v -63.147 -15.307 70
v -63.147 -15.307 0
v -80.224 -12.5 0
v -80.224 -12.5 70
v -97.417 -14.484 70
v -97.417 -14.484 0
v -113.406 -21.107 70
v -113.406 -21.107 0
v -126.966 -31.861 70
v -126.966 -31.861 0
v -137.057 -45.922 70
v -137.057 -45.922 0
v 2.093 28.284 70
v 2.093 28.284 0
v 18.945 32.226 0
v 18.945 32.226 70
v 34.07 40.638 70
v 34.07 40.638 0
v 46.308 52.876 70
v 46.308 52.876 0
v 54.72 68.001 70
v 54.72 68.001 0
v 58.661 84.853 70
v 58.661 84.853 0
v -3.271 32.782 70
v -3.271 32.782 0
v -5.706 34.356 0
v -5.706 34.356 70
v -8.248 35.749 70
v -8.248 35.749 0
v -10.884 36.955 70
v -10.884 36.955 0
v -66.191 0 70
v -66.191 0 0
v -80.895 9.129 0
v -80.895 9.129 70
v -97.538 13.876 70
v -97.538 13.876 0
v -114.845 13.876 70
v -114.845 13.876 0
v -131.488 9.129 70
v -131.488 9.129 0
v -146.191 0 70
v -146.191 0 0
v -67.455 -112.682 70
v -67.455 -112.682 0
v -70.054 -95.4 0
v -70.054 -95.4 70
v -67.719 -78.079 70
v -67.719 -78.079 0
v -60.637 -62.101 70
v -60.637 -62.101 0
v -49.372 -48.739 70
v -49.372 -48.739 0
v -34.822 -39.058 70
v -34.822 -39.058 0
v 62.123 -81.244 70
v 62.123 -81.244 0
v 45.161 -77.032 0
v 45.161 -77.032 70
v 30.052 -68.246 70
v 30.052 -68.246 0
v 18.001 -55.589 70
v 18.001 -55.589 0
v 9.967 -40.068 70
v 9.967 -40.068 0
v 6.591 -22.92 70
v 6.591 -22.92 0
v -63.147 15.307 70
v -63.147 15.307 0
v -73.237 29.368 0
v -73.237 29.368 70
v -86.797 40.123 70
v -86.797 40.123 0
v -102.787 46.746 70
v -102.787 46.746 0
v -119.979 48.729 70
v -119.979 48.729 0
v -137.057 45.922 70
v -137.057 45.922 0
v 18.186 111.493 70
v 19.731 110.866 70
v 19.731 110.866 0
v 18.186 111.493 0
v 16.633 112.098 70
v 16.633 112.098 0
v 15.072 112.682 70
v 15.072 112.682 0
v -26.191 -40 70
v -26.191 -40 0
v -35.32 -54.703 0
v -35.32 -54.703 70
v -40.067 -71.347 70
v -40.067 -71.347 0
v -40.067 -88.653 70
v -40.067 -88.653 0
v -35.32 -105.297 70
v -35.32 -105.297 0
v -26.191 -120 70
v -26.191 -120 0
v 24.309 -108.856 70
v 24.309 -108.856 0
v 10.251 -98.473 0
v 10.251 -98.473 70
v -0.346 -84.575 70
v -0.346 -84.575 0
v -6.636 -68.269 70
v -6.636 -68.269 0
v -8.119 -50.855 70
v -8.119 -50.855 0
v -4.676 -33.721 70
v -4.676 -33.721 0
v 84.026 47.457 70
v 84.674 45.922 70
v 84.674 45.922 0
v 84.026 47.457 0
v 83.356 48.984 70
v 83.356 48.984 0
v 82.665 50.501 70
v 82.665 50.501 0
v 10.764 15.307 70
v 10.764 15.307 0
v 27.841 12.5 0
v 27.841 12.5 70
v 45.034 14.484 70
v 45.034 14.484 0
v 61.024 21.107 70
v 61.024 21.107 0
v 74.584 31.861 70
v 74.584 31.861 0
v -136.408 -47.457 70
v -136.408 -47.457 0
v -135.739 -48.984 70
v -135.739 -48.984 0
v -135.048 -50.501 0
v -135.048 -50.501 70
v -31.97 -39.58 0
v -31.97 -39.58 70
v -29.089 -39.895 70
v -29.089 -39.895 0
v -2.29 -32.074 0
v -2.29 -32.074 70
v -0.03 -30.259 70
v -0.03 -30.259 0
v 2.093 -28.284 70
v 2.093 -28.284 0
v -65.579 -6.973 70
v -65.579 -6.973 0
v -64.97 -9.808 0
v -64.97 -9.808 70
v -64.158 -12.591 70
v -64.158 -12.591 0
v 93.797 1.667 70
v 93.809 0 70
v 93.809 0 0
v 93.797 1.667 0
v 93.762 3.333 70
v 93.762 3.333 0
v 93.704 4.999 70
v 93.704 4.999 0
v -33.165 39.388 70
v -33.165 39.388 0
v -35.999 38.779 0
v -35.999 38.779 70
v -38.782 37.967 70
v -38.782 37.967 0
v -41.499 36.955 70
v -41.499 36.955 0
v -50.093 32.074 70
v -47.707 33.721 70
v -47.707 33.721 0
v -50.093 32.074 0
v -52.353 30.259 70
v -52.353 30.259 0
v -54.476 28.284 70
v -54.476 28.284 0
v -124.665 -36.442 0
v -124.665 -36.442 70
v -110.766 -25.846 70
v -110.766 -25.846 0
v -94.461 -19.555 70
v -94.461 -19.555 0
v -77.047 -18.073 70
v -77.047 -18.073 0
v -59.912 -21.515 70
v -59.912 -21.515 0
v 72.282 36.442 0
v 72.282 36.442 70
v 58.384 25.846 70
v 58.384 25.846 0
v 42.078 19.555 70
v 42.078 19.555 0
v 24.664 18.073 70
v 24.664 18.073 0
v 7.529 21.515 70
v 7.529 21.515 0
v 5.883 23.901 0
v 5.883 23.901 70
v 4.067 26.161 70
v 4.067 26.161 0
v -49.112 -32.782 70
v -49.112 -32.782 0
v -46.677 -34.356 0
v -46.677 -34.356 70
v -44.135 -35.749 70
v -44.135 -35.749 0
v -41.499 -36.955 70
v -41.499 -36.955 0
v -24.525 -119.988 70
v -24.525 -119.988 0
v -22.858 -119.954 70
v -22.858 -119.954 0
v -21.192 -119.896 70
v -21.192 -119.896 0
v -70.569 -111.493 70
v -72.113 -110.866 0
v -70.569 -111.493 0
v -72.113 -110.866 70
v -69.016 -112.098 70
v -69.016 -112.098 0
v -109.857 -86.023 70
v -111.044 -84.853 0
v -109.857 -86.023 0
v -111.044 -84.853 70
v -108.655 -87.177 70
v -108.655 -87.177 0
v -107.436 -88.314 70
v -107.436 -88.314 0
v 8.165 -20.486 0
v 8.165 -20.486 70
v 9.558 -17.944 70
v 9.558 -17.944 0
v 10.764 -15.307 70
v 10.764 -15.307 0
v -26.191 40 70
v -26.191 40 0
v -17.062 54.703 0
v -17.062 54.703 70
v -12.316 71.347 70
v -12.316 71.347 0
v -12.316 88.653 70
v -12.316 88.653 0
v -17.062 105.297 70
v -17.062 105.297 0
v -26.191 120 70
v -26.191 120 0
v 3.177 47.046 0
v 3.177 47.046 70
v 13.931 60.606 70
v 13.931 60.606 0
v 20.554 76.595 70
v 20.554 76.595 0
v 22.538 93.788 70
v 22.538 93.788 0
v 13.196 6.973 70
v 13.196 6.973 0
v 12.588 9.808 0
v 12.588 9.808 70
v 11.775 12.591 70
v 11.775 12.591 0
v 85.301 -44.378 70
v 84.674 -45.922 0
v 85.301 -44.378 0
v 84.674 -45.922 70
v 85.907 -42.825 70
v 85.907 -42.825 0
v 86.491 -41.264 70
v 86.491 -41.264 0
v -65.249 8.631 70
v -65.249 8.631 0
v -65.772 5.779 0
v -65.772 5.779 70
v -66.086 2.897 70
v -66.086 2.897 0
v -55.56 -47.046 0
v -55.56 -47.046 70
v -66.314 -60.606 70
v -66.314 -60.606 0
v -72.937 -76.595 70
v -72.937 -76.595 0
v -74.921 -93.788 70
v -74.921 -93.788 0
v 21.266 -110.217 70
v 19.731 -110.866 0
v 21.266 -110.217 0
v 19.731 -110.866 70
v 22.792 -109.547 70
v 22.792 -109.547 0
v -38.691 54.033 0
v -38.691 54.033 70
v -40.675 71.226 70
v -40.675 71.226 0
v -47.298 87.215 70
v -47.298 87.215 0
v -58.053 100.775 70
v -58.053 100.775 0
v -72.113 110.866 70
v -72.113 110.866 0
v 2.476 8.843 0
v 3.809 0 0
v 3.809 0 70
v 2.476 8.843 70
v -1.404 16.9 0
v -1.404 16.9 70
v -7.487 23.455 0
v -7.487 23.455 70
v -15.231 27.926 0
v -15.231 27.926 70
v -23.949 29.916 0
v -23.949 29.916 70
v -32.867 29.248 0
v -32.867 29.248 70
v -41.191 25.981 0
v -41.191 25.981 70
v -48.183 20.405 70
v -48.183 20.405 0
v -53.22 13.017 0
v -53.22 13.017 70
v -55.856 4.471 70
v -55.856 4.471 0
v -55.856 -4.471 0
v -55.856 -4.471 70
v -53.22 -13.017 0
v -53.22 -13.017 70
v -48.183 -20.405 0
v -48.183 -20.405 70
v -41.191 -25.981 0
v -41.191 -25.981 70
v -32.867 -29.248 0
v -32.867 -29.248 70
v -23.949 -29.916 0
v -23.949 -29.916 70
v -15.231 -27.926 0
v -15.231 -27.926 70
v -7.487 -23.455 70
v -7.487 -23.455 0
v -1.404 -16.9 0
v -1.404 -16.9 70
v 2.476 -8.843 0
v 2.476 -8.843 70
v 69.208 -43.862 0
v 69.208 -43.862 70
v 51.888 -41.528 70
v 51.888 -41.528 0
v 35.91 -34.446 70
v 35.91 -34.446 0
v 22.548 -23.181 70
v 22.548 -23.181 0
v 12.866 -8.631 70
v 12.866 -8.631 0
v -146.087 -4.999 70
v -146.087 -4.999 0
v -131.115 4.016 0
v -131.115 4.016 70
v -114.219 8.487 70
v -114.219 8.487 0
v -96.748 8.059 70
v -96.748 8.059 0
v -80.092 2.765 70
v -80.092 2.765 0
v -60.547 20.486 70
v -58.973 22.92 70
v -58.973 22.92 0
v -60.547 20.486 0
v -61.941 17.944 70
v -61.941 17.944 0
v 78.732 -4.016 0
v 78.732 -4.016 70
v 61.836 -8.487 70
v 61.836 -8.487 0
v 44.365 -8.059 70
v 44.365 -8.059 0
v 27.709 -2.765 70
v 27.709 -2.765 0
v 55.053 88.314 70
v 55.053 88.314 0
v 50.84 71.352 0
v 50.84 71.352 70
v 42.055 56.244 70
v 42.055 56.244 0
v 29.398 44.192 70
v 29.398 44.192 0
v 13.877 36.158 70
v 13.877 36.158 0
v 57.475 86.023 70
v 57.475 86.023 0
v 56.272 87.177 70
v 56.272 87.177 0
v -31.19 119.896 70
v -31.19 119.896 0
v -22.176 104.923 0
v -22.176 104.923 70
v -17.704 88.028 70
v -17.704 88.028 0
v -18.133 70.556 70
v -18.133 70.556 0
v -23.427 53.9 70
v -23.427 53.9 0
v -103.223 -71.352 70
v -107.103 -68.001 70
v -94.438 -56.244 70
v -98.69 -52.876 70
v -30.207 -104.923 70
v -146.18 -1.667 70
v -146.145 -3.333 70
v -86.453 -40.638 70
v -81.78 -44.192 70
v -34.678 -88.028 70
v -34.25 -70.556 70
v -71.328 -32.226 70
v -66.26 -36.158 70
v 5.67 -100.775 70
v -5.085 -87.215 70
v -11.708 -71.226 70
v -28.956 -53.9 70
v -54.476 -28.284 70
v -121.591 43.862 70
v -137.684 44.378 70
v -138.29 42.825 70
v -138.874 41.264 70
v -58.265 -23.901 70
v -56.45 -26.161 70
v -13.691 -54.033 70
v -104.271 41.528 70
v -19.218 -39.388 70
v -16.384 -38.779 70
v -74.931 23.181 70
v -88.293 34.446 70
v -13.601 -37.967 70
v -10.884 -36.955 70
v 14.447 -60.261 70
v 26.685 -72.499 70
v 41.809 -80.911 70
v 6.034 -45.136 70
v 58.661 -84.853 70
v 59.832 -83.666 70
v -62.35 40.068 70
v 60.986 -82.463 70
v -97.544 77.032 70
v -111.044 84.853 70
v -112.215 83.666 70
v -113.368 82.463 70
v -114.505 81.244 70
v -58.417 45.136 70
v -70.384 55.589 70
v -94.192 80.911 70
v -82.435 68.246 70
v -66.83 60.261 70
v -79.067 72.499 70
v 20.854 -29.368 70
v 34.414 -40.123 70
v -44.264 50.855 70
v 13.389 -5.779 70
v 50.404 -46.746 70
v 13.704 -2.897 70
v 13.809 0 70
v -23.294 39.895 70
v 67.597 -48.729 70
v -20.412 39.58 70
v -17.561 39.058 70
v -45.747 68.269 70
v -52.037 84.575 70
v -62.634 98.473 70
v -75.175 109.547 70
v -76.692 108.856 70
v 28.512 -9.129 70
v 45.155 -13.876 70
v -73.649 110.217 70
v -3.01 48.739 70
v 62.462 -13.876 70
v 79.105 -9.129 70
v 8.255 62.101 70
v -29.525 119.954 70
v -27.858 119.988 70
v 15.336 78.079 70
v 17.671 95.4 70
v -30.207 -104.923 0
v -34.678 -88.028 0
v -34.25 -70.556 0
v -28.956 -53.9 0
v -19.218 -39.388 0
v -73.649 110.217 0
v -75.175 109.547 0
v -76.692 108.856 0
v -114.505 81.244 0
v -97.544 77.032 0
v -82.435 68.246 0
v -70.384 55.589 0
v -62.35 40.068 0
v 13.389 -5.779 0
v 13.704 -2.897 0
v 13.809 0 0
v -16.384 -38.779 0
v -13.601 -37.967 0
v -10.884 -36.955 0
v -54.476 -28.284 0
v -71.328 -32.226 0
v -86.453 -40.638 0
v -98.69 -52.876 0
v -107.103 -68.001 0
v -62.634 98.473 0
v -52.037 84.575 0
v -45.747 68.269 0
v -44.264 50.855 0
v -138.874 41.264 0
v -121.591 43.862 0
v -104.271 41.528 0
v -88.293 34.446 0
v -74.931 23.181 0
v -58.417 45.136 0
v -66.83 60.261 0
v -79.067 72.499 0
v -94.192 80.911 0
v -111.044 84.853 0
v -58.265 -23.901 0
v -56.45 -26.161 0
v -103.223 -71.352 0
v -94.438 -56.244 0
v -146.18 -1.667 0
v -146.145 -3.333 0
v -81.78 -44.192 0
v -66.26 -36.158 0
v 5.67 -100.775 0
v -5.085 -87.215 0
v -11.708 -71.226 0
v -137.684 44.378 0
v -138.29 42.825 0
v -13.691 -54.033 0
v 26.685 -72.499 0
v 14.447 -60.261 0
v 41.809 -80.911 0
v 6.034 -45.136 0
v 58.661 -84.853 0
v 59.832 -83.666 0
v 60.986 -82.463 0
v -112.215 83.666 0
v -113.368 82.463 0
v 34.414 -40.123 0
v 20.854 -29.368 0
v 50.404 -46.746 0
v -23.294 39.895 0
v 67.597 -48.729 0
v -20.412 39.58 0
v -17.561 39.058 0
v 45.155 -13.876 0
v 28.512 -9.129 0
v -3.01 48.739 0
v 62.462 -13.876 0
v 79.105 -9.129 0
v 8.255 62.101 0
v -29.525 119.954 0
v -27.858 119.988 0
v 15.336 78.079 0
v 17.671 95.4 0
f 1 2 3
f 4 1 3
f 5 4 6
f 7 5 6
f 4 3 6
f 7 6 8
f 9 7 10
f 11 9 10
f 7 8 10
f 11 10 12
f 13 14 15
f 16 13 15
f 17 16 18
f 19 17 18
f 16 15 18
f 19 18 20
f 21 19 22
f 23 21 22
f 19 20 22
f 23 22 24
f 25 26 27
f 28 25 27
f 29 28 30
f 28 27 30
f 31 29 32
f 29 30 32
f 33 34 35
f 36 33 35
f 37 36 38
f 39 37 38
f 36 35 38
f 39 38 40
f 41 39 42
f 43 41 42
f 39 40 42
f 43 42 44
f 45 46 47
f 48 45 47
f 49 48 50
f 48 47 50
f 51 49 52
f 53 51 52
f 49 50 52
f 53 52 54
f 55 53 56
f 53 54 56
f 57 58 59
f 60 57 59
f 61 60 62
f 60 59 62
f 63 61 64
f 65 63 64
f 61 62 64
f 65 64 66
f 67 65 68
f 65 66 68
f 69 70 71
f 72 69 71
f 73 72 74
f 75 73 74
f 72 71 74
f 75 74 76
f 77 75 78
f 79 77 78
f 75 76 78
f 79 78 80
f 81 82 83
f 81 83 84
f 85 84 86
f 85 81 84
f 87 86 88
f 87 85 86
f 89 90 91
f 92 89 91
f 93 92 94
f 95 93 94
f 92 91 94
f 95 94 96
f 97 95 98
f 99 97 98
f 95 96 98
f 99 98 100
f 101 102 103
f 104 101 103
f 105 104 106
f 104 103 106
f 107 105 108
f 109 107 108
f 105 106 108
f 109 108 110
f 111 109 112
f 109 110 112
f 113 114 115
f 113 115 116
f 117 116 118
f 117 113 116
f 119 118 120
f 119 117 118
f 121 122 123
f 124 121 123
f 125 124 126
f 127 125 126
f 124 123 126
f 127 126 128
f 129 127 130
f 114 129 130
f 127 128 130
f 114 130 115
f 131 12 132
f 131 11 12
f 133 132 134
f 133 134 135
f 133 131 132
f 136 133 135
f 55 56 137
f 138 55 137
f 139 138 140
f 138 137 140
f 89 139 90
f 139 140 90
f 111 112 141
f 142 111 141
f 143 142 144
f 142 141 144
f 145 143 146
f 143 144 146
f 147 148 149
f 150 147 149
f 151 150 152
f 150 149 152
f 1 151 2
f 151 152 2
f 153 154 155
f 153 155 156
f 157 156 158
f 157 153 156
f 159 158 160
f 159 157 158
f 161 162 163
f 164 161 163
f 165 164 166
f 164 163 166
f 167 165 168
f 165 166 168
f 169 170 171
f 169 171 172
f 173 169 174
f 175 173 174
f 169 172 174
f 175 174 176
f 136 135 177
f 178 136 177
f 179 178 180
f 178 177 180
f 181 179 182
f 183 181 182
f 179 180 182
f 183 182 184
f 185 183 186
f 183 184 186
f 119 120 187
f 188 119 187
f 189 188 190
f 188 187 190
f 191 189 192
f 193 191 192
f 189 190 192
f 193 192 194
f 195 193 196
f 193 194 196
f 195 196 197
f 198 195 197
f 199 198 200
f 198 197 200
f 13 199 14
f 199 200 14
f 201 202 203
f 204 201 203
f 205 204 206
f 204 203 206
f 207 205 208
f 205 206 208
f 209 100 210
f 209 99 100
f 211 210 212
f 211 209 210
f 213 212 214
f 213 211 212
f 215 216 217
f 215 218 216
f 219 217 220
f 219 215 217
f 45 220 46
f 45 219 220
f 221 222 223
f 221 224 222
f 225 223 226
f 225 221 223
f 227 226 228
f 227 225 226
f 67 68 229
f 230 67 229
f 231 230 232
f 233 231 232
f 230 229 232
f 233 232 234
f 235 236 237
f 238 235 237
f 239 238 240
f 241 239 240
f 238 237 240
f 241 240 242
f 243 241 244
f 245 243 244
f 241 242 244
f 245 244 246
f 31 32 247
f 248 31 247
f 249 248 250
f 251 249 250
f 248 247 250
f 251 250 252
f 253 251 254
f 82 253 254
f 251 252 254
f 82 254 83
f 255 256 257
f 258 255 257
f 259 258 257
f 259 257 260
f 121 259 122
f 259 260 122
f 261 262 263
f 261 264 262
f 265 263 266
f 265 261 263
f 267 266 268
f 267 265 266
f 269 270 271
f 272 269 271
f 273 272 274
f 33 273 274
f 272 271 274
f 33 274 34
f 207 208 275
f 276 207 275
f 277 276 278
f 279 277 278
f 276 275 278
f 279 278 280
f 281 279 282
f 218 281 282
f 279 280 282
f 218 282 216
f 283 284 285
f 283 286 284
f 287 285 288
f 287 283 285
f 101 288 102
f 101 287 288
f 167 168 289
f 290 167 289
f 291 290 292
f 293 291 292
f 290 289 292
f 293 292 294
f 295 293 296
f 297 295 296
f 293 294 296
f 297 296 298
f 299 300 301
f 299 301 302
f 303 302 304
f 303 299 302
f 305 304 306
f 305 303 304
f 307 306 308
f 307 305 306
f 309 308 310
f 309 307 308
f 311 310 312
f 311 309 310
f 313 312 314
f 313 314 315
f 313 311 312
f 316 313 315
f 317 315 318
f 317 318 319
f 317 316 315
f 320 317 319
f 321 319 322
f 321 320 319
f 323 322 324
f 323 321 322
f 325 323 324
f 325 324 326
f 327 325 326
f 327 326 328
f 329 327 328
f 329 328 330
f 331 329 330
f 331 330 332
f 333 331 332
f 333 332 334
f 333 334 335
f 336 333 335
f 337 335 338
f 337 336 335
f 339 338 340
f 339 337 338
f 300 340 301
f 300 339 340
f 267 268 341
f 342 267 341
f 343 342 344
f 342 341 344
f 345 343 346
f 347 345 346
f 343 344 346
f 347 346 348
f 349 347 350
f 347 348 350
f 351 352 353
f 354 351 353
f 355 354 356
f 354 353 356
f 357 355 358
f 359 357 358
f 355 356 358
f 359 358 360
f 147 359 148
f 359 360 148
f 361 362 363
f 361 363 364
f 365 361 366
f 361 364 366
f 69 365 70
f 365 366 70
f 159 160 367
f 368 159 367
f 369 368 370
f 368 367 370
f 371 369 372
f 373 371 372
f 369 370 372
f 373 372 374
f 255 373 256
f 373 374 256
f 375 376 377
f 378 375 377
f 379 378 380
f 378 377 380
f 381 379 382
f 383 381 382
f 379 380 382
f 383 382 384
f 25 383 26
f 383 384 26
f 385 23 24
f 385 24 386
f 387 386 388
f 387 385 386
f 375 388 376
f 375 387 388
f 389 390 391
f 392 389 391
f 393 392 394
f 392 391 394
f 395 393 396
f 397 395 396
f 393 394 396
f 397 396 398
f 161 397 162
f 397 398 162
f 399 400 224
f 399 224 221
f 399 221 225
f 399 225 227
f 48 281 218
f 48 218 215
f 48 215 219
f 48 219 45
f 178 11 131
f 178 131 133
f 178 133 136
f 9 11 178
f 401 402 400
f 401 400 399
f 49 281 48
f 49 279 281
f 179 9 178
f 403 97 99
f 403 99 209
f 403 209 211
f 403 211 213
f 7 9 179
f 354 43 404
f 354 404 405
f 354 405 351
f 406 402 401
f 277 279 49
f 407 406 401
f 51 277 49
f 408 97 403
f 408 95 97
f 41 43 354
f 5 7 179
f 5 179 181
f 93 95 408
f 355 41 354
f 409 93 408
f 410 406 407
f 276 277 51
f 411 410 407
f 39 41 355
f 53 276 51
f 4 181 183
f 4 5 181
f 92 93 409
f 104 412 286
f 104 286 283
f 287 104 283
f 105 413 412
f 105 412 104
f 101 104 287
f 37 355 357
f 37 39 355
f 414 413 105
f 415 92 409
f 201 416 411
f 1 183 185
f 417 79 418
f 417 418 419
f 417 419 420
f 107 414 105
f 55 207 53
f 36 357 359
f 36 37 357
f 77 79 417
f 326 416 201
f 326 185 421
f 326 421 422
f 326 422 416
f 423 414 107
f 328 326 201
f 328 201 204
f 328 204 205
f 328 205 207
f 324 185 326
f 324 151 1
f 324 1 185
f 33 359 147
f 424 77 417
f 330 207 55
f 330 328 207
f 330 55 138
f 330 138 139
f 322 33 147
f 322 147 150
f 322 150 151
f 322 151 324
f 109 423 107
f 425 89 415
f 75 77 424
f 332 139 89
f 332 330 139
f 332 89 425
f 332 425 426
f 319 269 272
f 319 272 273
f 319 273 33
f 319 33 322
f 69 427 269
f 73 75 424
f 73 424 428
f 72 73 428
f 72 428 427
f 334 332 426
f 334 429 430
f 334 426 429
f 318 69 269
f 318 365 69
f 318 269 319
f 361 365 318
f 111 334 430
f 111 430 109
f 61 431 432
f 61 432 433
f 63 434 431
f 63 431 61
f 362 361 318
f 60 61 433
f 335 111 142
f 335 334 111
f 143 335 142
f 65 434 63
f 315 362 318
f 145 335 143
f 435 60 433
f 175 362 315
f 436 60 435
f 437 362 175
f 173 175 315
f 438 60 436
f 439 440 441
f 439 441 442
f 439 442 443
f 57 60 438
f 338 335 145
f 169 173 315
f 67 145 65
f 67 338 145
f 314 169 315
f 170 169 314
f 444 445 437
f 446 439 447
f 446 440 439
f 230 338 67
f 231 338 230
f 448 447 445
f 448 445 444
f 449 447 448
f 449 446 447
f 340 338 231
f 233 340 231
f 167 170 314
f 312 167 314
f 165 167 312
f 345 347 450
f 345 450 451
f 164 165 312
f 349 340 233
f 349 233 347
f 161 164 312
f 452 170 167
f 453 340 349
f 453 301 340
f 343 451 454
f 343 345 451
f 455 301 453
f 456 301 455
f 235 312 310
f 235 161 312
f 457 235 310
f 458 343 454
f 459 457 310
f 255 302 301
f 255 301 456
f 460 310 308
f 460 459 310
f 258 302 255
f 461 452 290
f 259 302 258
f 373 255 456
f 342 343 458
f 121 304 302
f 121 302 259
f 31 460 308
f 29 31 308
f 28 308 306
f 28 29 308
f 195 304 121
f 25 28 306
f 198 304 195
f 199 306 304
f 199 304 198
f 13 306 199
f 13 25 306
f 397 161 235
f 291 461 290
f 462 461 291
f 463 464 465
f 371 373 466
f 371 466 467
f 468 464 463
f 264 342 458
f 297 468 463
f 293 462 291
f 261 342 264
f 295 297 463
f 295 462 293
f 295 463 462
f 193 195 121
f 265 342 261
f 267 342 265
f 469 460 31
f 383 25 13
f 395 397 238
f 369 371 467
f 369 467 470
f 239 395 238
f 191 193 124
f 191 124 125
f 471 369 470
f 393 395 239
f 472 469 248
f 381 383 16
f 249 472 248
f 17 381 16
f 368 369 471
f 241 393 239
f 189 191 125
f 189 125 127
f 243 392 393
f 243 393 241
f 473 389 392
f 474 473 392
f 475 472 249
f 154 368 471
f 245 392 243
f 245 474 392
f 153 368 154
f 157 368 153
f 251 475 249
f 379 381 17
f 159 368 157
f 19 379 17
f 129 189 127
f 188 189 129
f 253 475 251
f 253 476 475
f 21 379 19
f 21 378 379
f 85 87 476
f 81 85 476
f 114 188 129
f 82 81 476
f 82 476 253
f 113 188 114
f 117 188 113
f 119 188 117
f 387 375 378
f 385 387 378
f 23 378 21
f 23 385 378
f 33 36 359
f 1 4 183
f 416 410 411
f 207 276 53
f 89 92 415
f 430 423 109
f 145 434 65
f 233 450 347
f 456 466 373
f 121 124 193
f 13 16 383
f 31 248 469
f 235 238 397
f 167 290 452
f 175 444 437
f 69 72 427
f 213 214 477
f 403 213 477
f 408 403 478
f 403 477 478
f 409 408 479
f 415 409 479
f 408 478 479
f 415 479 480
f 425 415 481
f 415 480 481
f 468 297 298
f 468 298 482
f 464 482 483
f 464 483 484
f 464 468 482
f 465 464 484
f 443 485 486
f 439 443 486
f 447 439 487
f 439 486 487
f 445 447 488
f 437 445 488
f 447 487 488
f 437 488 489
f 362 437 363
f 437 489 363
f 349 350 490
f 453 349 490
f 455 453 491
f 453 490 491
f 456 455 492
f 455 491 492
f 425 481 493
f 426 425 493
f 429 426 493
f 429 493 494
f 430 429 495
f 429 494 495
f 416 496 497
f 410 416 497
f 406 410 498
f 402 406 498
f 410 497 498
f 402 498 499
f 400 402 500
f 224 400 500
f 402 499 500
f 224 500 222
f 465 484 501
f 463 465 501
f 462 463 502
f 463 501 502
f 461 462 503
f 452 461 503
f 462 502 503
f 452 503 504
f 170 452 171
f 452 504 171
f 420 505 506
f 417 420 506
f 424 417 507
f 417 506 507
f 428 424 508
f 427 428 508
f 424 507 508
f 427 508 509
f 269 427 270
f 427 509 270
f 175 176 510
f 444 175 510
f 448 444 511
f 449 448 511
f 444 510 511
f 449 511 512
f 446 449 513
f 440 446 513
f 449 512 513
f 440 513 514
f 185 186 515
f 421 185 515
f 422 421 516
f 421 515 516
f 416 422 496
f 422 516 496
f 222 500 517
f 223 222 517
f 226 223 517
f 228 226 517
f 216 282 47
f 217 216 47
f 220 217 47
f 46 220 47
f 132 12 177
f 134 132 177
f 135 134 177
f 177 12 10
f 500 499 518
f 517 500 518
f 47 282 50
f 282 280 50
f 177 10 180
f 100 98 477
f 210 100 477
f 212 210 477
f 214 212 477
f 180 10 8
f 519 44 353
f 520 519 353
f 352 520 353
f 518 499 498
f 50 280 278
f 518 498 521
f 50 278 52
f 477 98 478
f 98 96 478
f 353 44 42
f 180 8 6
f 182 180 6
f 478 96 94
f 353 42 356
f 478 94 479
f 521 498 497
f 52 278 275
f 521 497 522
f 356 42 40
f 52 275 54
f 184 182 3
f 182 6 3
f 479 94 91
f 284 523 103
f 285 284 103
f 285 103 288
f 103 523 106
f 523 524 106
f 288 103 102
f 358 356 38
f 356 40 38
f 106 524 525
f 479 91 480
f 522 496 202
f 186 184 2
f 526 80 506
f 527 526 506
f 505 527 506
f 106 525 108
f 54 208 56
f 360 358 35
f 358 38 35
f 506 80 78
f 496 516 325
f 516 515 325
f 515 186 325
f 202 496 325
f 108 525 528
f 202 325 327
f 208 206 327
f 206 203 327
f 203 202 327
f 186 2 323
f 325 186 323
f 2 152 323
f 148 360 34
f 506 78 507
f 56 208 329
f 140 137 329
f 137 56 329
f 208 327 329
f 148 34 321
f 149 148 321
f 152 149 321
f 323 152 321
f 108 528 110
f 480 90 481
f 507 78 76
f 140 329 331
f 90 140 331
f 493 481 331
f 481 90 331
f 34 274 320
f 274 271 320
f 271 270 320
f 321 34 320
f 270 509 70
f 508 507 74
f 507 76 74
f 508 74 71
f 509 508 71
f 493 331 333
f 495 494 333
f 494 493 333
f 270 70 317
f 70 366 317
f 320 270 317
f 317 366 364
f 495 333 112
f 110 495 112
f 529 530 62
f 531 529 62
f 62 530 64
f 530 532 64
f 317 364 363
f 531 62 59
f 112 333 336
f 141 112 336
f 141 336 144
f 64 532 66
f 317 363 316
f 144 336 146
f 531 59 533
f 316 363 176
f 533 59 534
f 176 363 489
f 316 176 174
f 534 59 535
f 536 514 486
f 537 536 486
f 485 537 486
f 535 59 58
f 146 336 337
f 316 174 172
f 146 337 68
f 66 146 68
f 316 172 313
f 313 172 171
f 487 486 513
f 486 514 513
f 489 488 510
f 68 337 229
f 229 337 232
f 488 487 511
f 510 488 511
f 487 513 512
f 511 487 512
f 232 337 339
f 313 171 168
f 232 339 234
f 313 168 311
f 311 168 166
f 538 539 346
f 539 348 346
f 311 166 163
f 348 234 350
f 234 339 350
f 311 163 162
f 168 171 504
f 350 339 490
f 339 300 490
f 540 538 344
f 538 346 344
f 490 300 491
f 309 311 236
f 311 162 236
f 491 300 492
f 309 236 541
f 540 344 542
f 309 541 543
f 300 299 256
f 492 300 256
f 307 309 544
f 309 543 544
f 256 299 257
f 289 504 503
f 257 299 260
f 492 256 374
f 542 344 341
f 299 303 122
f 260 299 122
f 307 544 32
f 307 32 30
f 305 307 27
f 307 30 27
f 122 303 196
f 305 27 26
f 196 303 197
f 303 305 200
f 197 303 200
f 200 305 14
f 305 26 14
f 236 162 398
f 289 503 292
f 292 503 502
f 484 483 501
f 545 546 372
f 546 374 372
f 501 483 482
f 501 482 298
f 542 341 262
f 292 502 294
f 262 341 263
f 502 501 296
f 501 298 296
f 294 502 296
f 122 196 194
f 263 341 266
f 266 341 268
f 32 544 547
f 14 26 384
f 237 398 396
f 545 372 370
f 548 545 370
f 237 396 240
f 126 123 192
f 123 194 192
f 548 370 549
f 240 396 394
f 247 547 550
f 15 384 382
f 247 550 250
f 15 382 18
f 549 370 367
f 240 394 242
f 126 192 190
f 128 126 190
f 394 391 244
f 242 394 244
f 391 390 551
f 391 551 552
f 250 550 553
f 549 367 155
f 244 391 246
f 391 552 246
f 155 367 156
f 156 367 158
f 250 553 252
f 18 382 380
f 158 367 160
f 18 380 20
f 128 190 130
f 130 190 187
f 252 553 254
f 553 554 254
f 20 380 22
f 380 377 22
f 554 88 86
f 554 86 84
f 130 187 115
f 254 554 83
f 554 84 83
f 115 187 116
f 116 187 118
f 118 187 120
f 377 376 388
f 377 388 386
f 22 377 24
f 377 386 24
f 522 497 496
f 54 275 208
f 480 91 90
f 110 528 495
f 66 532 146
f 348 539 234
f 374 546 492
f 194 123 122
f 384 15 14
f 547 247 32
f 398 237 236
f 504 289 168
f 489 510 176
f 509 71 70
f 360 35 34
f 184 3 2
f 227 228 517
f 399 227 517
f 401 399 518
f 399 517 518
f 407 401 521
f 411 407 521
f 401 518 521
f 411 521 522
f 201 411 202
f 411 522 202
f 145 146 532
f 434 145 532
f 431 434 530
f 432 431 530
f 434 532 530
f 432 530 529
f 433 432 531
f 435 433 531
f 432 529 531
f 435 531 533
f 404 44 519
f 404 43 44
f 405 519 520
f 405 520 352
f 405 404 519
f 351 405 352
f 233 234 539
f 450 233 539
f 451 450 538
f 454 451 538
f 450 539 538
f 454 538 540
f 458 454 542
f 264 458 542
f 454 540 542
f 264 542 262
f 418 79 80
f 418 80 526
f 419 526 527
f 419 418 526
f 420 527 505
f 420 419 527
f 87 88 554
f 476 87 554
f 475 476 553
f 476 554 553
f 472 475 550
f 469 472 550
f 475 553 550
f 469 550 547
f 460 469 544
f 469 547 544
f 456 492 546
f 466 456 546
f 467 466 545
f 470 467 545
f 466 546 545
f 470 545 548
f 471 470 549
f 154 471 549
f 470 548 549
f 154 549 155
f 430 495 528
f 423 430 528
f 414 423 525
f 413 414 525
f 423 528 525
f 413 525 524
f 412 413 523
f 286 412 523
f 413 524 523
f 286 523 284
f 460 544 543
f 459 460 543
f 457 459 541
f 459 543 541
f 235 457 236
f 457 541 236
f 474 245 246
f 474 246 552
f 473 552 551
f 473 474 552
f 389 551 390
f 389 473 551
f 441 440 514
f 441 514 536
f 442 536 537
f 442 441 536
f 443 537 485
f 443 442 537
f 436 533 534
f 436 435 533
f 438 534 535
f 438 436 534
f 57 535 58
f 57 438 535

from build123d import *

# Parameters (mm, degrees)
SZKIC1_R                    = 40
SZKIC1_R_2                  = 30
DODANIE_WYCI_GNI_CIE1_DEPTH = 70
SZKIC2_R                    = 130
SZKIC2_R_2                  = 120
DODANIE_WYCI_GNI_CIE2_DEPTH = 70
DODANIE_WYCI_GNI_CIE3_START = -70
DODANIE_WYCI_GNI_CIE3_DEPTH = 70
SZYK_KO_OWY1_COUNT          = 16
SZKIC4_R                    = 130
SZKIC4_R_2                  = 120
WYTNIJ_WYCI_GNI_CIE1_DEPTH  = 70


with BuildPart() as part:
    # Szkic1 → Dodanie-wyciągnięcie1 (new body)
    with BuildSketch(Plane.XY):
        with Locations((-26.191385705, 0)):
            Circle(SZKIC1_R)
        with Locations((-26.191385705, 0)):
            Circle(SZKIC1_R_2, mode=Mode.SUBTRACT)
    extrude(amount=DODANIE_WYCI_GNI_CIE1_DEPTH)



with BuildPart() as body_2:
    # Szkic2 → Dodanie-wyciągnięcie2 (new body)
    with BuildSketch(Plane.XY.offset(70)):
        with Locations((-26.191385705, 0)):
            Circle(SZKIC2_R)
        with Locations((-26.191385705, 0)):
            Circle(SZKIC2_R_2, mode=Mode.SUBTRACT)
    extrude(amount=-DODANIE_WYCI_GNI_CIE2_DEPTH)


with BuildPart() as part_1:
    add(part.part)

    add(body_2.part)  # Dodanie-wyciągnięcie3 merges body 2
    # Szkic3 → Dodanie-wyciągnięcie3 (add)
    with BuildSketch(Plane.XY.offset(70).offset(DODANIE_WYCI_GNI_CIE3_START)):
        with BuildLine():
            ThreePointArc((-66.191385705, 0), (-106.191385705, 14.477555095), (-146.191385705, 0))
            ThreePointArc((-146.191385705, 0), (-146.165341212, -2.5), (-146.087219038, -4.998914813))
            ThreePointArc((-146.087219038, -4.998914813), (-105.468199385, 8.892478563), (-65.578885705, -6.973151637))
            ThreePointArc((-65.578885705, -6.973151637), (-66.037966486, -3.5), (-66.191385705, 0))
        make_face()
    dodanie_wyci_gni_cie3 = extrude(amount=DODANIE_WYCI_GNI_CIE3_DEPTH)

    # Szyk kołowy1: Dodanie-wyciągnięcie3 ×16 about axis
    szyk_ko_owy1_axis = Axis((-26.191385705, 0, 0), (0, 0, 1))
    for i in range(1, SZYK_KO_OWY1_COUNT):
        add(dodanie_wyci_gni_cie3.rotate(szyk_ko_owy1_axis, i * 360 / SZYK_KO_OWY1_COUNT))

    # Szkic4 → Wytnij-wyciągnięcie1 (cut)
    with BuildSketch(Plane.XY.offset(70)):
        with Locations((-26.191385705, 0)):
            Circle(SZKIC4_R)
        with Locations((-26.191385705, 0)):
            Circle(SZKIC4_R_2, mode=Mode.SUBTRACT)
    extrude(amount=-WYTNIJ_WYCI_GNI_CIE1_DEPTH, mode=Mode.SUBTRACT)


solid = part_1.part
